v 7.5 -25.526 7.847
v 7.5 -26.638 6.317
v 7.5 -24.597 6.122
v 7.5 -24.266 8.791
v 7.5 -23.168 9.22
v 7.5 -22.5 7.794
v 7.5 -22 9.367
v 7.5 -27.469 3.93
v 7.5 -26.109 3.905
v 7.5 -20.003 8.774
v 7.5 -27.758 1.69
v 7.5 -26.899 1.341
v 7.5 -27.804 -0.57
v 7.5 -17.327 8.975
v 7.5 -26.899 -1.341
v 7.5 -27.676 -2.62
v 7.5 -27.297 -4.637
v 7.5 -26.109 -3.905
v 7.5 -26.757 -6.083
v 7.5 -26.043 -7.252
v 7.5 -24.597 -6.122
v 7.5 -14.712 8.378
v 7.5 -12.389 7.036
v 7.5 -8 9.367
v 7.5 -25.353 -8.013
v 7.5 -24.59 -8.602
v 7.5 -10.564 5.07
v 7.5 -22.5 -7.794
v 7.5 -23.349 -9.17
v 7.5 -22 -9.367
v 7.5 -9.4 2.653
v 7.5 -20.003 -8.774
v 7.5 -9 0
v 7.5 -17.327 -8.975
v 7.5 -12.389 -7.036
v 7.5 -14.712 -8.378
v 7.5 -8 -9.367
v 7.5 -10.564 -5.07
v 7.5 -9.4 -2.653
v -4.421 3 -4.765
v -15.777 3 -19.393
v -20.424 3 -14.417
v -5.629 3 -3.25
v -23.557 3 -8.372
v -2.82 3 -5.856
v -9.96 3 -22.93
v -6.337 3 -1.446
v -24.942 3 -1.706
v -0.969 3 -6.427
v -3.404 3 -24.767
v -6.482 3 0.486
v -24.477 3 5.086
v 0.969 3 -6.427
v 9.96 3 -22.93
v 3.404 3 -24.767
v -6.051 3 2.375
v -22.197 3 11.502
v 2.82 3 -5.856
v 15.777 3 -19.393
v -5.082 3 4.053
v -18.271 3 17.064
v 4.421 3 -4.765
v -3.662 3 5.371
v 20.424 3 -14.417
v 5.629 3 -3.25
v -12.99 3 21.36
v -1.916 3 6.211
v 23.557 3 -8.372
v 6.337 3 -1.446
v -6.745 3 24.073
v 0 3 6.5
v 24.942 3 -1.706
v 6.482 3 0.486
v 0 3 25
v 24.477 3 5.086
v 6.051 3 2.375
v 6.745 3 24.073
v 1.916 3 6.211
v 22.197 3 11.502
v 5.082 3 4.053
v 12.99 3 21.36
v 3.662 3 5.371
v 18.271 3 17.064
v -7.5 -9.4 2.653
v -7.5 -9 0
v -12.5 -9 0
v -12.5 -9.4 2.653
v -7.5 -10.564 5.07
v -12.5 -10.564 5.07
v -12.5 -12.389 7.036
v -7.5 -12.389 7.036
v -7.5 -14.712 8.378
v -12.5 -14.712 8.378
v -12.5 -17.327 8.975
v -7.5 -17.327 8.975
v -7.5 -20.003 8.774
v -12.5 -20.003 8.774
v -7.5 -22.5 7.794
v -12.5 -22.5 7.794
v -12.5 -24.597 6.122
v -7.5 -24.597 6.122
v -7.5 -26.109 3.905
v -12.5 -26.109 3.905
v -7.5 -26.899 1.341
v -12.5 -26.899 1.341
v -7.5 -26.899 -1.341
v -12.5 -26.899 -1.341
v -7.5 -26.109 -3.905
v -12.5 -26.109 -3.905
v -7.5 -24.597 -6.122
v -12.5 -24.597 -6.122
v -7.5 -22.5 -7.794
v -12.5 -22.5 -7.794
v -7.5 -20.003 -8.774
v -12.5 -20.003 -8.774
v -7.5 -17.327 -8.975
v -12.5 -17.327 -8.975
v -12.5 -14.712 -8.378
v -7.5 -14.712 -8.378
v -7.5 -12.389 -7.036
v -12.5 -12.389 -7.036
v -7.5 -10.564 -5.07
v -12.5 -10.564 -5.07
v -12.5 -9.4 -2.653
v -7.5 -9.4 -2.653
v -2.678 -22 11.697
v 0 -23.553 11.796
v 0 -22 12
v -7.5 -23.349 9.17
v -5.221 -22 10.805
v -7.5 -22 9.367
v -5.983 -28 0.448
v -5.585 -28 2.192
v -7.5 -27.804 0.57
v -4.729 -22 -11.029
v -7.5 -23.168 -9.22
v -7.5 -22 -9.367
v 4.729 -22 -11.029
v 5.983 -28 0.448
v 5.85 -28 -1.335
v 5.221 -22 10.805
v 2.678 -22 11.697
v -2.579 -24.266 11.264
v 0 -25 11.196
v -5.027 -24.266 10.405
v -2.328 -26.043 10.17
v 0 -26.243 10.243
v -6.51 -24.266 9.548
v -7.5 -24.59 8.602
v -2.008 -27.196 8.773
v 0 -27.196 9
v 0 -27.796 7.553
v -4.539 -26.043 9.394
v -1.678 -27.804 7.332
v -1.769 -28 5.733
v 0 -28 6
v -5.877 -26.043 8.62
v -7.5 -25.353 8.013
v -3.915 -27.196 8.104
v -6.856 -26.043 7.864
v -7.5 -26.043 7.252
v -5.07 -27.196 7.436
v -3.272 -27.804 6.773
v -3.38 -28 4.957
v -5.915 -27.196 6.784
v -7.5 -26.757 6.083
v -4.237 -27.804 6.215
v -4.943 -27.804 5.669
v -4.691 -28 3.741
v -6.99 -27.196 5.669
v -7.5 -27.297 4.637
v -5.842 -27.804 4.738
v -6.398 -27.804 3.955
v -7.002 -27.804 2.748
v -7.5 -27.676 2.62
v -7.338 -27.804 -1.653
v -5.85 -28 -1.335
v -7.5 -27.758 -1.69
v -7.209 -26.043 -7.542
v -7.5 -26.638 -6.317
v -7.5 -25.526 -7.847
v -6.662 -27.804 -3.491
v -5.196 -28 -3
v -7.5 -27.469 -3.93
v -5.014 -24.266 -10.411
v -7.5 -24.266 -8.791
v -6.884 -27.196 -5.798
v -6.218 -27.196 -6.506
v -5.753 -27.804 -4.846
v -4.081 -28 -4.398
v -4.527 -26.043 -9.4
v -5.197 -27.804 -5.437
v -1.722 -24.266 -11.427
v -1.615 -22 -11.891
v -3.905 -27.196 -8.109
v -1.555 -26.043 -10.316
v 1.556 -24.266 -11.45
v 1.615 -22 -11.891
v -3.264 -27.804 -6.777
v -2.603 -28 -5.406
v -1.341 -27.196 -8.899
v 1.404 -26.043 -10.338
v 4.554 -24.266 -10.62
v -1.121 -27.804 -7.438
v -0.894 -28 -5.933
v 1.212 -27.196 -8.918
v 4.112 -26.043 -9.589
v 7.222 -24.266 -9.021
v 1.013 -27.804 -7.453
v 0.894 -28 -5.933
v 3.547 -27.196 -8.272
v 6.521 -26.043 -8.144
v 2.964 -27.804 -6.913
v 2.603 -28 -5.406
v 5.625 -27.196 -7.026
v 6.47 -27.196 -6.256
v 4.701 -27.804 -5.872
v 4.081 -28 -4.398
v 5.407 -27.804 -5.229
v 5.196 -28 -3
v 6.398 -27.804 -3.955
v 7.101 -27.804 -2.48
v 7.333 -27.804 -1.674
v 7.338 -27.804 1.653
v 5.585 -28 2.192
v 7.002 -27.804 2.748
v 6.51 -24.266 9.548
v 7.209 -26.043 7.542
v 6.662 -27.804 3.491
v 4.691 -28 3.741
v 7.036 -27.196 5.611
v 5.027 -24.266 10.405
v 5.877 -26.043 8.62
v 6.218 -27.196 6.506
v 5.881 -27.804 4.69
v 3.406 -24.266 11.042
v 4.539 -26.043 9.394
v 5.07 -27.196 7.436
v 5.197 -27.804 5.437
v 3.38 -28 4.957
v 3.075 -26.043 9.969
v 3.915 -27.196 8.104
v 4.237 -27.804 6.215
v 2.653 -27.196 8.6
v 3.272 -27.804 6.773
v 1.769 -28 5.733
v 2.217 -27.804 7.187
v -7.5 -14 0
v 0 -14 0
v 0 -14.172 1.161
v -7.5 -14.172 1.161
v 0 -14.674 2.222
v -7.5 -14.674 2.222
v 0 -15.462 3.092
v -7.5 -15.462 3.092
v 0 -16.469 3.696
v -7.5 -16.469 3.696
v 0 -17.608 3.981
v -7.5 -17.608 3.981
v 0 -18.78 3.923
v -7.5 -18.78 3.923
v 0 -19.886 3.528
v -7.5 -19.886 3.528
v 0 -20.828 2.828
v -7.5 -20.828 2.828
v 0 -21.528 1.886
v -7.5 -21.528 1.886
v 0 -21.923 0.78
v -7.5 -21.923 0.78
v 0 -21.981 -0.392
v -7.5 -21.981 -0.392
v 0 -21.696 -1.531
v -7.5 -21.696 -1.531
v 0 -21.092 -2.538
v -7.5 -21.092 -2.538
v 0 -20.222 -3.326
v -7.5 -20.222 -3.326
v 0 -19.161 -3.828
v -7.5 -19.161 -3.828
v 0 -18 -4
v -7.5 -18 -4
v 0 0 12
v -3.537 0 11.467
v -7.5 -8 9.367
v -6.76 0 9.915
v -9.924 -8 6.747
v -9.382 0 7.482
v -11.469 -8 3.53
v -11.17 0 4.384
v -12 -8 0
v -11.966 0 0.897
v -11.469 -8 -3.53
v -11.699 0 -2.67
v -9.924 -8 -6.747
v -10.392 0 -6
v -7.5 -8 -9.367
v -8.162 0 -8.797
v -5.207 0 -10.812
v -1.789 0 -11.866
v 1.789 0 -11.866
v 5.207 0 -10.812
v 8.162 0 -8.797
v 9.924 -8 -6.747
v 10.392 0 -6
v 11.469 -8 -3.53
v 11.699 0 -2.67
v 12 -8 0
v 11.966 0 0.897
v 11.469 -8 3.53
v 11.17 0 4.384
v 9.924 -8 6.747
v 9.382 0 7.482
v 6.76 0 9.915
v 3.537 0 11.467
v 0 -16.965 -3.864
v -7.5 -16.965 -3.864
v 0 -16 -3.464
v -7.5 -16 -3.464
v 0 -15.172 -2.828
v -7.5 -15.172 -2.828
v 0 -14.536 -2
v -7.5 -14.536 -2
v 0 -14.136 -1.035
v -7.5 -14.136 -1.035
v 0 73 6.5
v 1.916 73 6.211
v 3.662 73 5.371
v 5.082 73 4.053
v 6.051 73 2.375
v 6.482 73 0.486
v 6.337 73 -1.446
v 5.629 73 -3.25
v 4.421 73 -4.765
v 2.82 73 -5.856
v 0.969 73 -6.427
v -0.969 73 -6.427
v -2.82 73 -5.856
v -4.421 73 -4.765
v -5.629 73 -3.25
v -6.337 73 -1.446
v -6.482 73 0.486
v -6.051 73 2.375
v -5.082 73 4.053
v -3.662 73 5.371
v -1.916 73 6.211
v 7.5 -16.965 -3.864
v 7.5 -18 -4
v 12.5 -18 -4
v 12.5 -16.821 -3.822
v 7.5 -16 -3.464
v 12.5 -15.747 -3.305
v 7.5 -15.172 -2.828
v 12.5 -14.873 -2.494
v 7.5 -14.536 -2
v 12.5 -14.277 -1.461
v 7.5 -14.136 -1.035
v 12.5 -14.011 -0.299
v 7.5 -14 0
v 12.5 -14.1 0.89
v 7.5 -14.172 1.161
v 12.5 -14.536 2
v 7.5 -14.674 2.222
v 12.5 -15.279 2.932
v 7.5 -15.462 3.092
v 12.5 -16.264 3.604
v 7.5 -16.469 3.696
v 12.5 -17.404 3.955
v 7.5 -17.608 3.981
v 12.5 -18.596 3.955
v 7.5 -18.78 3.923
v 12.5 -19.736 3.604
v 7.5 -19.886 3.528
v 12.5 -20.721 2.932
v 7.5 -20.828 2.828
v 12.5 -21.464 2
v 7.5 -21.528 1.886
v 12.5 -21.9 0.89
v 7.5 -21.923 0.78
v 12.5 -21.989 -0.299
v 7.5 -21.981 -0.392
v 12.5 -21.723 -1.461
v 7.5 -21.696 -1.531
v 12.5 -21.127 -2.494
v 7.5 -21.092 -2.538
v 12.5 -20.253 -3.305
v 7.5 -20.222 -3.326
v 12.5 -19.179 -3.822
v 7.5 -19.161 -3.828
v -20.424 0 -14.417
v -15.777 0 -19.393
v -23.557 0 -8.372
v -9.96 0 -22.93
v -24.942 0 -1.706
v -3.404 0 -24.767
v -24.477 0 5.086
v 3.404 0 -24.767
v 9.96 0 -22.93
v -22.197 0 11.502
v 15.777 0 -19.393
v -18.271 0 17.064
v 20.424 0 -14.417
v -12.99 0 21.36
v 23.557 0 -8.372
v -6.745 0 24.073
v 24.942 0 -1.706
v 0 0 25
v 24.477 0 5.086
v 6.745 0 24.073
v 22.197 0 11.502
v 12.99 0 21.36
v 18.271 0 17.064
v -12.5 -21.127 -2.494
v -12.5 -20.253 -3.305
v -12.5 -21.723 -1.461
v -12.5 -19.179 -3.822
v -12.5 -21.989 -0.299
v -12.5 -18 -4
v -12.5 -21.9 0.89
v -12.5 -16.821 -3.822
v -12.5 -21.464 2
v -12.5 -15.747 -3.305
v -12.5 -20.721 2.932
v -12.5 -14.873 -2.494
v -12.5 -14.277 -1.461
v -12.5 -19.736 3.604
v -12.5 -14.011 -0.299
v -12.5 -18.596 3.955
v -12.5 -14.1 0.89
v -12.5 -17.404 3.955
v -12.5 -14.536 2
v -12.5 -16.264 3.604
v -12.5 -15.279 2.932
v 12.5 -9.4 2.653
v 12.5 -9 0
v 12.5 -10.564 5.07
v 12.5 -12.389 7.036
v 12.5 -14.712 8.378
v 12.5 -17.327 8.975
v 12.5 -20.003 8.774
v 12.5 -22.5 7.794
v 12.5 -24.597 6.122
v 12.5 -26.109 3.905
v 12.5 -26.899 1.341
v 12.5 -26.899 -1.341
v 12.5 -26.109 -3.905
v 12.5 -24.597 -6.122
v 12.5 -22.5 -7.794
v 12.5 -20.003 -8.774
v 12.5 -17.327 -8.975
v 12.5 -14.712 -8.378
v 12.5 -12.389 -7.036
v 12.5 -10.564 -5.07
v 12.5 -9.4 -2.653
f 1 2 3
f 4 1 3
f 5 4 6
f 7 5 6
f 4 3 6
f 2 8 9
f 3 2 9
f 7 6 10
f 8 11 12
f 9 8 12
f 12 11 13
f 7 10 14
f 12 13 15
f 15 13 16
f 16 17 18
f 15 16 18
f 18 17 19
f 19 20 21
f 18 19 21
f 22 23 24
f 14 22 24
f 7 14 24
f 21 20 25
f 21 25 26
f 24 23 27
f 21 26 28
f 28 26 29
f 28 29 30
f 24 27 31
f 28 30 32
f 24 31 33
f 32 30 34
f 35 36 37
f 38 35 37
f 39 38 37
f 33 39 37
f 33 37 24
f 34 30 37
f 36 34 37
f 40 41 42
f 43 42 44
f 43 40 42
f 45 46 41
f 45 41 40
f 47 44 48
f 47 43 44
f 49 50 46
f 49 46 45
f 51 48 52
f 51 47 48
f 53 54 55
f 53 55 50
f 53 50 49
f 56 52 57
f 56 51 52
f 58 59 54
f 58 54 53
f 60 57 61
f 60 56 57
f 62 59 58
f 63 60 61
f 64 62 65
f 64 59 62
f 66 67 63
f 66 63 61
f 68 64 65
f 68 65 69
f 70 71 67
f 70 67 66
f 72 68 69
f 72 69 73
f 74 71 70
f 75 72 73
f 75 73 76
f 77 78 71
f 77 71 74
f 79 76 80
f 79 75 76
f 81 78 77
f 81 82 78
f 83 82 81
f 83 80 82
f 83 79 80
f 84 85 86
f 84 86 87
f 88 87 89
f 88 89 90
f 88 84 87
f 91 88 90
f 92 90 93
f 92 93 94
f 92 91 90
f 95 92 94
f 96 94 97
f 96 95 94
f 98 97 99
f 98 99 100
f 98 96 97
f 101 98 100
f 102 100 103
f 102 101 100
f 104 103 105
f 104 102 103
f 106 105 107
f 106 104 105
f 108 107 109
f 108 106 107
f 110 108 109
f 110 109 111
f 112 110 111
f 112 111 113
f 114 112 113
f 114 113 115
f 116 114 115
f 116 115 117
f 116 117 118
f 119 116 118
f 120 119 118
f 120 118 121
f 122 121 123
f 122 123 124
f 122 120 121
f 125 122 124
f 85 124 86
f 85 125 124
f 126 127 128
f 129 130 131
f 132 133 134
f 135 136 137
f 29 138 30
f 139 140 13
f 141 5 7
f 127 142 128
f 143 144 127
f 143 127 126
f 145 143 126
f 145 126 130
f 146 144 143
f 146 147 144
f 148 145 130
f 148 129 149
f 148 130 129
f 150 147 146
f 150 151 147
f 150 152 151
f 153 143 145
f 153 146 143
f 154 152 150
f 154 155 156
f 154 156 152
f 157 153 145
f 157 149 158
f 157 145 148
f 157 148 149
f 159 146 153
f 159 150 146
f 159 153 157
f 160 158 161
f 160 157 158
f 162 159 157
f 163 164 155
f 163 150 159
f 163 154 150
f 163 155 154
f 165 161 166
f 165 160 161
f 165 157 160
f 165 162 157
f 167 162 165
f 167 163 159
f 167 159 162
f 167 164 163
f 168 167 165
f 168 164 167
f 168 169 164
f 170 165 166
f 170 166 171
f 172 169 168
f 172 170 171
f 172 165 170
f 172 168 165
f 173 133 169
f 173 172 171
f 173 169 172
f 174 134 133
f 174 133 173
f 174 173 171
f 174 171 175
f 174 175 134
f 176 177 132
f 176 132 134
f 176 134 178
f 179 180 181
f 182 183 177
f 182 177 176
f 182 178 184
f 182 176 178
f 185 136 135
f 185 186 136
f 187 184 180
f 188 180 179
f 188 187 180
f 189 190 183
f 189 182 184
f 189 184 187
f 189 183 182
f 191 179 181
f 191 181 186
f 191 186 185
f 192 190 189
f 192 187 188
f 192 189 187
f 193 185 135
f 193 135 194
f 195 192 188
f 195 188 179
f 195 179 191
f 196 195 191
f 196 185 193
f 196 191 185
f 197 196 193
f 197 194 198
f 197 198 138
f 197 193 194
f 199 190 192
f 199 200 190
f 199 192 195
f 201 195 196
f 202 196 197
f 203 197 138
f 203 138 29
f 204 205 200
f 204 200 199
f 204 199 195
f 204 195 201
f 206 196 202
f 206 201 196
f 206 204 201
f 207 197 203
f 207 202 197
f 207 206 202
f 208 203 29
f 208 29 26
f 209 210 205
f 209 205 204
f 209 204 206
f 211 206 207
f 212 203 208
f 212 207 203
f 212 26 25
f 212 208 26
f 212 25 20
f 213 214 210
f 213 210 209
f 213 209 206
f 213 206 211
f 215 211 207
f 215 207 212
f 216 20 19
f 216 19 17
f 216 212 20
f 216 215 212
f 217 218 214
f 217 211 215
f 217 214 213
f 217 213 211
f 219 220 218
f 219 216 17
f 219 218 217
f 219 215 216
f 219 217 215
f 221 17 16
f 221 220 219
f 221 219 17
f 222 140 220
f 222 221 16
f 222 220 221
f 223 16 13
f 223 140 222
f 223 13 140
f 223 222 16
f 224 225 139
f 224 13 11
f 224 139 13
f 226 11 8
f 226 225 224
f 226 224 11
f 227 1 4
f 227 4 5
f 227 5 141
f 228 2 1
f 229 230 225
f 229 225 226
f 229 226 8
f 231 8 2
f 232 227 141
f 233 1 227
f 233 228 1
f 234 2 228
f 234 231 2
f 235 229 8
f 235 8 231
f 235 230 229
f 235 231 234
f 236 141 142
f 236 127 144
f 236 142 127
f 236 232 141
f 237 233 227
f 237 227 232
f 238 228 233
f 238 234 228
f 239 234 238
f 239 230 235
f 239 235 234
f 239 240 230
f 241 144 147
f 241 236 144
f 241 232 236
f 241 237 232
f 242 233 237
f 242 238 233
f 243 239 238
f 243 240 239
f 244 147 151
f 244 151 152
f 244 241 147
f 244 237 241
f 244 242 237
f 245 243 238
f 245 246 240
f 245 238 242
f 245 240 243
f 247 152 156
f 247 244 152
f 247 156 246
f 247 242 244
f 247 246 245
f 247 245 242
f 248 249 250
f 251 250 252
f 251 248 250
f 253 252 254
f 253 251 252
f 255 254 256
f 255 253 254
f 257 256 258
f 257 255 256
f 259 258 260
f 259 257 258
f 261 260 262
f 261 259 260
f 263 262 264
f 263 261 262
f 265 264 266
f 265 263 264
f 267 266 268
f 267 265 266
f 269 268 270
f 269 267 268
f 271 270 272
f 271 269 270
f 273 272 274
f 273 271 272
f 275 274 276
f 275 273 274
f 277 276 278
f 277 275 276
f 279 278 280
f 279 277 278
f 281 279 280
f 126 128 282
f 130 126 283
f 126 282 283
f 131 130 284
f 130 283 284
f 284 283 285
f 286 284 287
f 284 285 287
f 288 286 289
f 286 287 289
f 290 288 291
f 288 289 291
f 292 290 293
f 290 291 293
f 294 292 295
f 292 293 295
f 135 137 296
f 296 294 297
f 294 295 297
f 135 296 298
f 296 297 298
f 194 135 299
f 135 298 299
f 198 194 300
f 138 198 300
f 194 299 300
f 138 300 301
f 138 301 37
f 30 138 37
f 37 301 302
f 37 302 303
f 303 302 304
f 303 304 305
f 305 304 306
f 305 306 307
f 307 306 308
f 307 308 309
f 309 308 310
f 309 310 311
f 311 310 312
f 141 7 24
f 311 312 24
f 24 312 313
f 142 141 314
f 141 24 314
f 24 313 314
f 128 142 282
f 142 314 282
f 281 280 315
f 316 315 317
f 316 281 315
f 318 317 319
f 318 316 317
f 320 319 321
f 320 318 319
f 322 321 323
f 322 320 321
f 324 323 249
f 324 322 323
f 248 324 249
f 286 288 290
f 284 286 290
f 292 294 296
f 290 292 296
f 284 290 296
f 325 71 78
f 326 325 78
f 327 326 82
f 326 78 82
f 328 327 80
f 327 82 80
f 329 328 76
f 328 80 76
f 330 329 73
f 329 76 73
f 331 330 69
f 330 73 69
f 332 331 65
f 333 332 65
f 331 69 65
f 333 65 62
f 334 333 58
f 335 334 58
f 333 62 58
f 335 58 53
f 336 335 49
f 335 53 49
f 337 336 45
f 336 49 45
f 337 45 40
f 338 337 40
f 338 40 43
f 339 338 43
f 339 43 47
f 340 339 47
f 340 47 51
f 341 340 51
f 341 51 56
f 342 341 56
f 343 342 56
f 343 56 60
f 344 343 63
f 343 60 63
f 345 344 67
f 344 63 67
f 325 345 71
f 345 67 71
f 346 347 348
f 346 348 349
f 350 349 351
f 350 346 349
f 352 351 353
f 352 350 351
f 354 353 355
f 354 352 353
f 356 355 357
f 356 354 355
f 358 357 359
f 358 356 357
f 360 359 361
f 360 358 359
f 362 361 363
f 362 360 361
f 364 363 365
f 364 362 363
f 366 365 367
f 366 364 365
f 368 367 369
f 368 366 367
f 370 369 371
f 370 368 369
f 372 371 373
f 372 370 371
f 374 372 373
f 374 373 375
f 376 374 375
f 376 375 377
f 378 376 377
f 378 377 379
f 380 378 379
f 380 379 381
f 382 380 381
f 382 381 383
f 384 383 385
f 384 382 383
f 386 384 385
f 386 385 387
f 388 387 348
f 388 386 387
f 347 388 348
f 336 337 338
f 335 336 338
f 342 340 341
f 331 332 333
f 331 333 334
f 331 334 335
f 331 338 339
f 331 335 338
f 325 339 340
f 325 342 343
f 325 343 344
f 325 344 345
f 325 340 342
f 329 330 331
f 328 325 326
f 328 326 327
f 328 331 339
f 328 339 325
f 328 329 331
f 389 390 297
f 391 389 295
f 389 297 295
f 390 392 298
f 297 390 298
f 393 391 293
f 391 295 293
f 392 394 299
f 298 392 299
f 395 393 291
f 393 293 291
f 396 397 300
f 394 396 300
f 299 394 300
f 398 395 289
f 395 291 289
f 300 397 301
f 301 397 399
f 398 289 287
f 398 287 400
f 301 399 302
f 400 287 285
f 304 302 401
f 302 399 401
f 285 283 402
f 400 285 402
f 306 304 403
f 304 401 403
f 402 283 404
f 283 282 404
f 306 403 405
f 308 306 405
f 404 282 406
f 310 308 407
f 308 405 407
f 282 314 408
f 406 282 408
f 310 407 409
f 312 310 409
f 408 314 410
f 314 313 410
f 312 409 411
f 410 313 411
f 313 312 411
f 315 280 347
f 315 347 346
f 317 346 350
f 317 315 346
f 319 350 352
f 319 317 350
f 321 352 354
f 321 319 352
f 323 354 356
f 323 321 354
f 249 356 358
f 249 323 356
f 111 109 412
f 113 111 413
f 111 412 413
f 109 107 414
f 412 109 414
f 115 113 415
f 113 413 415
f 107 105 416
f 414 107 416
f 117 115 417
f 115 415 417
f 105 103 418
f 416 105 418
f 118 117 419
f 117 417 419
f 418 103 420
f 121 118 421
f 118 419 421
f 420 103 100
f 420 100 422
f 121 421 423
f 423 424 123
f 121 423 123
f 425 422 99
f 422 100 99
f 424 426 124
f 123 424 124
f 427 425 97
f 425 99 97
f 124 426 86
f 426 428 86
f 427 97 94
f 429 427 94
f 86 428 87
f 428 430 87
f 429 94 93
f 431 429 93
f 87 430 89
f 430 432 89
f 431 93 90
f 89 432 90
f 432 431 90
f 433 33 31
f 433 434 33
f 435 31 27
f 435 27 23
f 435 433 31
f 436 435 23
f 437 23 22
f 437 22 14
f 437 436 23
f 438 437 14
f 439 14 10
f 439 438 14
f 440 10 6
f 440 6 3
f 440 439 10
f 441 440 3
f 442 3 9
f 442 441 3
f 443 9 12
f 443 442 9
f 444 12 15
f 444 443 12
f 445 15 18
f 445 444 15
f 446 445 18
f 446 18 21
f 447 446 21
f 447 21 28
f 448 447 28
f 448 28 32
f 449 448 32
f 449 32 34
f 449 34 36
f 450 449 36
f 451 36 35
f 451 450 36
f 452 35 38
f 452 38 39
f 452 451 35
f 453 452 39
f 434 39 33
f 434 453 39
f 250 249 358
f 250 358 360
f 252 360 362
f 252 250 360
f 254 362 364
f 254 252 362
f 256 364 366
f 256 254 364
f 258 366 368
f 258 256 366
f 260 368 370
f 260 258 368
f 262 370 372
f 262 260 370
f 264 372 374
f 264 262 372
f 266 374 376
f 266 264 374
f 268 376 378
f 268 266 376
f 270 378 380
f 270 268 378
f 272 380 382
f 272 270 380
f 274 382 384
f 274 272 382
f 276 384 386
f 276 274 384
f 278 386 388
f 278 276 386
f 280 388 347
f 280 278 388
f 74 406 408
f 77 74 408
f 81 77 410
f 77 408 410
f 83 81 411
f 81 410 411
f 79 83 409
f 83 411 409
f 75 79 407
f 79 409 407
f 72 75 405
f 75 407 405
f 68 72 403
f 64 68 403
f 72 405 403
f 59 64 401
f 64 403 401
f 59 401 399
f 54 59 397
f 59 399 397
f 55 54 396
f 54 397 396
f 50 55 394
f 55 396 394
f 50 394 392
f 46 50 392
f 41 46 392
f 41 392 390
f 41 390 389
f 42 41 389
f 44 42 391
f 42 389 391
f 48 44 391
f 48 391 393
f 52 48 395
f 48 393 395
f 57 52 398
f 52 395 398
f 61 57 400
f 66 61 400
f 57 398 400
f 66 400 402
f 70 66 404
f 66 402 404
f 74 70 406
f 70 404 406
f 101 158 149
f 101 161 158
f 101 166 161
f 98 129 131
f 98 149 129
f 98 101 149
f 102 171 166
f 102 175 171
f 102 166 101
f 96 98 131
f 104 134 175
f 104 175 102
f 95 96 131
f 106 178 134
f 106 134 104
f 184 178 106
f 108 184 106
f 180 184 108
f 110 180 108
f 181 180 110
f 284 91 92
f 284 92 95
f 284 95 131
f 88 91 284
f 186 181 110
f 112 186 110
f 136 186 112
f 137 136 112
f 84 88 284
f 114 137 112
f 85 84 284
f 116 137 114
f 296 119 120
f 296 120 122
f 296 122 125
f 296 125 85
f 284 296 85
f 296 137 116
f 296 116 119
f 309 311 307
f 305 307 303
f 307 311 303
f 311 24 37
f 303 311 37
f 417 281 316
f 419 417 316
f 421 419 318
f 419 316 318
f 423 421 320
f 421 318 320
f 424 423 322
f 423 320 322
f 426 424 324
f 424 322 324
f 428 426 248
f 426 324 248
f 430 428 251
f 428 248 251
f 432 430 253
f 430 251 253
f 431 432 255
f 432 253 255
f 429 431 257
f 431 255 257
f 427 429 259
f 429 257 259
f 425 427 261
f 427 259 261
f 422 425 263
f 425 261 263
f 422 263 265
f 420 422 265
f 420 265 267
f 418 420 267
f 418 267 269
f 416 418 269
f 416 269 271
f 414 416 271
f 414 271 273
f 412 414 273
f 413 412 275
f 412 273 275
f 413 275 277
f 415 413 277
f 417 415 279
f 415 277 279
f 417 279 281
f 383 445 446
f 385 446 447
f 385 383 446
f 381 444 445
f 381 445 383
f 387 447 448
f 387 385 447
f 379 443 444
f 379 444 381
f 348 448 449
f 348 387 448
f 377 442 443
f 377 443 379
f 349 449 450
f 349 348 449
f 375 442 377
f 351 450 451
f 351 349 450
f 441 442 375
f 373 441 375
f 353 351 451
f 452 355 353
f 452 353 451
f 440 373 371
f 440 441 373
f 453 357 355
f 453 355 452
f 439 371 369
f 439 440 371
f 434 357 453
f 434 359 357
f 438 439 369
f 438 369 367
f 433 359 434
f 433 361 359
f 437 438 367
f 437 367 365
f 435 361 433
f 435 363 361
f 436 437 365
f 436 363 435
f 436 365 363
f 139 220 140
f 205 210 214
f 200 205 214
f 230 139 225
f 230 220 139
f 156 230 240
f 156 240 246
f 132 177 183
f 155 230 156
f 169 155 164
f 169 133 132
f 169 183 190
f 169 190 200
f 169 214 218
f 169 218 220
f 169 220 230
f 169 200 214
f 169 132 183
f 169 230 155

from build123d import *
from build123d.topology import SkipClean

# Parameters (mm, degrees)
SKETCH1_R               = 25
BOSS_EXTRUDE1_DEPTH     = 3
SKETCH2_R               = 6.5
BOSS_EXTRUDE2_DEPTH     = 70
SKETCH3_R               = 12
BOSS_EXTRUDE3_DEPTH     = 28
FILLET1_R               = 6
CUT_EXTRUDE1_DEPTH      = 82.111035008
CUT_EXTRUDE1_DEPTH_BACK = 82.111035008
SKETCH4_W               = 15
SKETCH4_H               = 20
CUT_EXTRUDE2_DEPTH      = 84.727235712
CUT_EXTRUDE2_DEPTH_BACK = 84.727235712
SKETCH5_R               = 4
SKETCH7_R               = 9
SKETCH7_R_2             = 4
BOSS_EXTRUDE4_DEPTH     = 12.5


with BuildPart() as part:
    # Sketch1 → Boss-Extrude1 (new body)
    with BuildSketch(Plane(origin=(0, 0, 0), x_dir=(1, 0, 0), z_dir=(0, 1, 0))):
        with Locations(Location((0, 0, 0), (0, 0, 270))):
            Circle(SKETCH1_R)
    extrude(amount=BOSS_EXTRUDE1_DEPTH)

    # Sketch2 → Boss-Extrude2 (add)
    with BuildSketch(Plane(origin=(0, 3, 0), x_dir=(1, 0, 0), z_dir=(0, 1, 0))):
        with Locations(Location((0, 0, 0), (0, 0, 270))):
            Circle(SKETCH2_R)
    extrude(amount=BOSS_EXTRUDE2_DEPTH)

    # Sketch3 → Boss-Extrude3 (add)
    with BuildSketch(Plane.XZ):
        with Locations(Location((0, 0, 0), (0, 0, 90))):
            Circle(SKETCH3_R)
    extrude(amount=BOSS_EXTRUDE3_DEPTH)

    # Fillet1
    fillet1_edges = [part.edges().sort_by_distance(p)[0] for p in [
        (0, -28, -12),
    ]]
    fillet(fillet1_edges, radius=FILLET1_R)

    # Sketch4 → Cut-Extrude1 (cut, two sides: drawn at the far end of the back side and taken through both)
    with BuildSketch(Plane.XY.offset(-CUT_EXTRUDE1_DEPTH_BACK)):
        with Locations((-15, -18)):
            Rectangle(SKETCH4_W, SKETCH4_H)
        with Locations((15, -18)):
            Rectangle(SKETCH4_W, SKETCH4_H)
    extrude(amount=CUT_EXTRUDE1_DEPTH + CUT_EXTRUDE1_DEPTH_BACK, mode=Mode.SUBTRACT)

    # Sketch5 → Cut-Extrude2 (cut, two sides: drawn at the far end of the back side and taken through both)
    with BuildSketch(Plane(origin=(7.5, 0, 0), x_dir=(0, 0, -1), z_dir=(1, 0, 0)).offset(-CUT_EXTRUDE2_DEPTH_BACK)):
        with Locations(Location((0, -18, 0), (0, 0, 90))):
            Circle(SKETCH5_R)
    extrude(amount=CUT_EXTRUDE2_DEPTH + CUT_EXTRUDE2_DEPTH_BACK, mode=Mode.SUBTRACT)

    # Sketch7 → Boss-Extrude4 (add, symmetric)
    with SkipClean():  # the faces are left unmerged after this step: merging them gives an invalid solid
        with BuildSketch(Plane(origin=(0, 0, 0), x_dir=(0, 0, -1), z_dir=(1, 0, 0))):
            with Locations(Location((0, -18, 0), (0, 0, 90))):
                Circle(SKETCH7_R)
            with Locations((0, -18)):
                Circle(SKETCH7_R_2, mode=Mode.SUBTRACT)
        extrude(amount=BOSS_EXTRUDE4_DEPTH, both=True)


solid = part.part
